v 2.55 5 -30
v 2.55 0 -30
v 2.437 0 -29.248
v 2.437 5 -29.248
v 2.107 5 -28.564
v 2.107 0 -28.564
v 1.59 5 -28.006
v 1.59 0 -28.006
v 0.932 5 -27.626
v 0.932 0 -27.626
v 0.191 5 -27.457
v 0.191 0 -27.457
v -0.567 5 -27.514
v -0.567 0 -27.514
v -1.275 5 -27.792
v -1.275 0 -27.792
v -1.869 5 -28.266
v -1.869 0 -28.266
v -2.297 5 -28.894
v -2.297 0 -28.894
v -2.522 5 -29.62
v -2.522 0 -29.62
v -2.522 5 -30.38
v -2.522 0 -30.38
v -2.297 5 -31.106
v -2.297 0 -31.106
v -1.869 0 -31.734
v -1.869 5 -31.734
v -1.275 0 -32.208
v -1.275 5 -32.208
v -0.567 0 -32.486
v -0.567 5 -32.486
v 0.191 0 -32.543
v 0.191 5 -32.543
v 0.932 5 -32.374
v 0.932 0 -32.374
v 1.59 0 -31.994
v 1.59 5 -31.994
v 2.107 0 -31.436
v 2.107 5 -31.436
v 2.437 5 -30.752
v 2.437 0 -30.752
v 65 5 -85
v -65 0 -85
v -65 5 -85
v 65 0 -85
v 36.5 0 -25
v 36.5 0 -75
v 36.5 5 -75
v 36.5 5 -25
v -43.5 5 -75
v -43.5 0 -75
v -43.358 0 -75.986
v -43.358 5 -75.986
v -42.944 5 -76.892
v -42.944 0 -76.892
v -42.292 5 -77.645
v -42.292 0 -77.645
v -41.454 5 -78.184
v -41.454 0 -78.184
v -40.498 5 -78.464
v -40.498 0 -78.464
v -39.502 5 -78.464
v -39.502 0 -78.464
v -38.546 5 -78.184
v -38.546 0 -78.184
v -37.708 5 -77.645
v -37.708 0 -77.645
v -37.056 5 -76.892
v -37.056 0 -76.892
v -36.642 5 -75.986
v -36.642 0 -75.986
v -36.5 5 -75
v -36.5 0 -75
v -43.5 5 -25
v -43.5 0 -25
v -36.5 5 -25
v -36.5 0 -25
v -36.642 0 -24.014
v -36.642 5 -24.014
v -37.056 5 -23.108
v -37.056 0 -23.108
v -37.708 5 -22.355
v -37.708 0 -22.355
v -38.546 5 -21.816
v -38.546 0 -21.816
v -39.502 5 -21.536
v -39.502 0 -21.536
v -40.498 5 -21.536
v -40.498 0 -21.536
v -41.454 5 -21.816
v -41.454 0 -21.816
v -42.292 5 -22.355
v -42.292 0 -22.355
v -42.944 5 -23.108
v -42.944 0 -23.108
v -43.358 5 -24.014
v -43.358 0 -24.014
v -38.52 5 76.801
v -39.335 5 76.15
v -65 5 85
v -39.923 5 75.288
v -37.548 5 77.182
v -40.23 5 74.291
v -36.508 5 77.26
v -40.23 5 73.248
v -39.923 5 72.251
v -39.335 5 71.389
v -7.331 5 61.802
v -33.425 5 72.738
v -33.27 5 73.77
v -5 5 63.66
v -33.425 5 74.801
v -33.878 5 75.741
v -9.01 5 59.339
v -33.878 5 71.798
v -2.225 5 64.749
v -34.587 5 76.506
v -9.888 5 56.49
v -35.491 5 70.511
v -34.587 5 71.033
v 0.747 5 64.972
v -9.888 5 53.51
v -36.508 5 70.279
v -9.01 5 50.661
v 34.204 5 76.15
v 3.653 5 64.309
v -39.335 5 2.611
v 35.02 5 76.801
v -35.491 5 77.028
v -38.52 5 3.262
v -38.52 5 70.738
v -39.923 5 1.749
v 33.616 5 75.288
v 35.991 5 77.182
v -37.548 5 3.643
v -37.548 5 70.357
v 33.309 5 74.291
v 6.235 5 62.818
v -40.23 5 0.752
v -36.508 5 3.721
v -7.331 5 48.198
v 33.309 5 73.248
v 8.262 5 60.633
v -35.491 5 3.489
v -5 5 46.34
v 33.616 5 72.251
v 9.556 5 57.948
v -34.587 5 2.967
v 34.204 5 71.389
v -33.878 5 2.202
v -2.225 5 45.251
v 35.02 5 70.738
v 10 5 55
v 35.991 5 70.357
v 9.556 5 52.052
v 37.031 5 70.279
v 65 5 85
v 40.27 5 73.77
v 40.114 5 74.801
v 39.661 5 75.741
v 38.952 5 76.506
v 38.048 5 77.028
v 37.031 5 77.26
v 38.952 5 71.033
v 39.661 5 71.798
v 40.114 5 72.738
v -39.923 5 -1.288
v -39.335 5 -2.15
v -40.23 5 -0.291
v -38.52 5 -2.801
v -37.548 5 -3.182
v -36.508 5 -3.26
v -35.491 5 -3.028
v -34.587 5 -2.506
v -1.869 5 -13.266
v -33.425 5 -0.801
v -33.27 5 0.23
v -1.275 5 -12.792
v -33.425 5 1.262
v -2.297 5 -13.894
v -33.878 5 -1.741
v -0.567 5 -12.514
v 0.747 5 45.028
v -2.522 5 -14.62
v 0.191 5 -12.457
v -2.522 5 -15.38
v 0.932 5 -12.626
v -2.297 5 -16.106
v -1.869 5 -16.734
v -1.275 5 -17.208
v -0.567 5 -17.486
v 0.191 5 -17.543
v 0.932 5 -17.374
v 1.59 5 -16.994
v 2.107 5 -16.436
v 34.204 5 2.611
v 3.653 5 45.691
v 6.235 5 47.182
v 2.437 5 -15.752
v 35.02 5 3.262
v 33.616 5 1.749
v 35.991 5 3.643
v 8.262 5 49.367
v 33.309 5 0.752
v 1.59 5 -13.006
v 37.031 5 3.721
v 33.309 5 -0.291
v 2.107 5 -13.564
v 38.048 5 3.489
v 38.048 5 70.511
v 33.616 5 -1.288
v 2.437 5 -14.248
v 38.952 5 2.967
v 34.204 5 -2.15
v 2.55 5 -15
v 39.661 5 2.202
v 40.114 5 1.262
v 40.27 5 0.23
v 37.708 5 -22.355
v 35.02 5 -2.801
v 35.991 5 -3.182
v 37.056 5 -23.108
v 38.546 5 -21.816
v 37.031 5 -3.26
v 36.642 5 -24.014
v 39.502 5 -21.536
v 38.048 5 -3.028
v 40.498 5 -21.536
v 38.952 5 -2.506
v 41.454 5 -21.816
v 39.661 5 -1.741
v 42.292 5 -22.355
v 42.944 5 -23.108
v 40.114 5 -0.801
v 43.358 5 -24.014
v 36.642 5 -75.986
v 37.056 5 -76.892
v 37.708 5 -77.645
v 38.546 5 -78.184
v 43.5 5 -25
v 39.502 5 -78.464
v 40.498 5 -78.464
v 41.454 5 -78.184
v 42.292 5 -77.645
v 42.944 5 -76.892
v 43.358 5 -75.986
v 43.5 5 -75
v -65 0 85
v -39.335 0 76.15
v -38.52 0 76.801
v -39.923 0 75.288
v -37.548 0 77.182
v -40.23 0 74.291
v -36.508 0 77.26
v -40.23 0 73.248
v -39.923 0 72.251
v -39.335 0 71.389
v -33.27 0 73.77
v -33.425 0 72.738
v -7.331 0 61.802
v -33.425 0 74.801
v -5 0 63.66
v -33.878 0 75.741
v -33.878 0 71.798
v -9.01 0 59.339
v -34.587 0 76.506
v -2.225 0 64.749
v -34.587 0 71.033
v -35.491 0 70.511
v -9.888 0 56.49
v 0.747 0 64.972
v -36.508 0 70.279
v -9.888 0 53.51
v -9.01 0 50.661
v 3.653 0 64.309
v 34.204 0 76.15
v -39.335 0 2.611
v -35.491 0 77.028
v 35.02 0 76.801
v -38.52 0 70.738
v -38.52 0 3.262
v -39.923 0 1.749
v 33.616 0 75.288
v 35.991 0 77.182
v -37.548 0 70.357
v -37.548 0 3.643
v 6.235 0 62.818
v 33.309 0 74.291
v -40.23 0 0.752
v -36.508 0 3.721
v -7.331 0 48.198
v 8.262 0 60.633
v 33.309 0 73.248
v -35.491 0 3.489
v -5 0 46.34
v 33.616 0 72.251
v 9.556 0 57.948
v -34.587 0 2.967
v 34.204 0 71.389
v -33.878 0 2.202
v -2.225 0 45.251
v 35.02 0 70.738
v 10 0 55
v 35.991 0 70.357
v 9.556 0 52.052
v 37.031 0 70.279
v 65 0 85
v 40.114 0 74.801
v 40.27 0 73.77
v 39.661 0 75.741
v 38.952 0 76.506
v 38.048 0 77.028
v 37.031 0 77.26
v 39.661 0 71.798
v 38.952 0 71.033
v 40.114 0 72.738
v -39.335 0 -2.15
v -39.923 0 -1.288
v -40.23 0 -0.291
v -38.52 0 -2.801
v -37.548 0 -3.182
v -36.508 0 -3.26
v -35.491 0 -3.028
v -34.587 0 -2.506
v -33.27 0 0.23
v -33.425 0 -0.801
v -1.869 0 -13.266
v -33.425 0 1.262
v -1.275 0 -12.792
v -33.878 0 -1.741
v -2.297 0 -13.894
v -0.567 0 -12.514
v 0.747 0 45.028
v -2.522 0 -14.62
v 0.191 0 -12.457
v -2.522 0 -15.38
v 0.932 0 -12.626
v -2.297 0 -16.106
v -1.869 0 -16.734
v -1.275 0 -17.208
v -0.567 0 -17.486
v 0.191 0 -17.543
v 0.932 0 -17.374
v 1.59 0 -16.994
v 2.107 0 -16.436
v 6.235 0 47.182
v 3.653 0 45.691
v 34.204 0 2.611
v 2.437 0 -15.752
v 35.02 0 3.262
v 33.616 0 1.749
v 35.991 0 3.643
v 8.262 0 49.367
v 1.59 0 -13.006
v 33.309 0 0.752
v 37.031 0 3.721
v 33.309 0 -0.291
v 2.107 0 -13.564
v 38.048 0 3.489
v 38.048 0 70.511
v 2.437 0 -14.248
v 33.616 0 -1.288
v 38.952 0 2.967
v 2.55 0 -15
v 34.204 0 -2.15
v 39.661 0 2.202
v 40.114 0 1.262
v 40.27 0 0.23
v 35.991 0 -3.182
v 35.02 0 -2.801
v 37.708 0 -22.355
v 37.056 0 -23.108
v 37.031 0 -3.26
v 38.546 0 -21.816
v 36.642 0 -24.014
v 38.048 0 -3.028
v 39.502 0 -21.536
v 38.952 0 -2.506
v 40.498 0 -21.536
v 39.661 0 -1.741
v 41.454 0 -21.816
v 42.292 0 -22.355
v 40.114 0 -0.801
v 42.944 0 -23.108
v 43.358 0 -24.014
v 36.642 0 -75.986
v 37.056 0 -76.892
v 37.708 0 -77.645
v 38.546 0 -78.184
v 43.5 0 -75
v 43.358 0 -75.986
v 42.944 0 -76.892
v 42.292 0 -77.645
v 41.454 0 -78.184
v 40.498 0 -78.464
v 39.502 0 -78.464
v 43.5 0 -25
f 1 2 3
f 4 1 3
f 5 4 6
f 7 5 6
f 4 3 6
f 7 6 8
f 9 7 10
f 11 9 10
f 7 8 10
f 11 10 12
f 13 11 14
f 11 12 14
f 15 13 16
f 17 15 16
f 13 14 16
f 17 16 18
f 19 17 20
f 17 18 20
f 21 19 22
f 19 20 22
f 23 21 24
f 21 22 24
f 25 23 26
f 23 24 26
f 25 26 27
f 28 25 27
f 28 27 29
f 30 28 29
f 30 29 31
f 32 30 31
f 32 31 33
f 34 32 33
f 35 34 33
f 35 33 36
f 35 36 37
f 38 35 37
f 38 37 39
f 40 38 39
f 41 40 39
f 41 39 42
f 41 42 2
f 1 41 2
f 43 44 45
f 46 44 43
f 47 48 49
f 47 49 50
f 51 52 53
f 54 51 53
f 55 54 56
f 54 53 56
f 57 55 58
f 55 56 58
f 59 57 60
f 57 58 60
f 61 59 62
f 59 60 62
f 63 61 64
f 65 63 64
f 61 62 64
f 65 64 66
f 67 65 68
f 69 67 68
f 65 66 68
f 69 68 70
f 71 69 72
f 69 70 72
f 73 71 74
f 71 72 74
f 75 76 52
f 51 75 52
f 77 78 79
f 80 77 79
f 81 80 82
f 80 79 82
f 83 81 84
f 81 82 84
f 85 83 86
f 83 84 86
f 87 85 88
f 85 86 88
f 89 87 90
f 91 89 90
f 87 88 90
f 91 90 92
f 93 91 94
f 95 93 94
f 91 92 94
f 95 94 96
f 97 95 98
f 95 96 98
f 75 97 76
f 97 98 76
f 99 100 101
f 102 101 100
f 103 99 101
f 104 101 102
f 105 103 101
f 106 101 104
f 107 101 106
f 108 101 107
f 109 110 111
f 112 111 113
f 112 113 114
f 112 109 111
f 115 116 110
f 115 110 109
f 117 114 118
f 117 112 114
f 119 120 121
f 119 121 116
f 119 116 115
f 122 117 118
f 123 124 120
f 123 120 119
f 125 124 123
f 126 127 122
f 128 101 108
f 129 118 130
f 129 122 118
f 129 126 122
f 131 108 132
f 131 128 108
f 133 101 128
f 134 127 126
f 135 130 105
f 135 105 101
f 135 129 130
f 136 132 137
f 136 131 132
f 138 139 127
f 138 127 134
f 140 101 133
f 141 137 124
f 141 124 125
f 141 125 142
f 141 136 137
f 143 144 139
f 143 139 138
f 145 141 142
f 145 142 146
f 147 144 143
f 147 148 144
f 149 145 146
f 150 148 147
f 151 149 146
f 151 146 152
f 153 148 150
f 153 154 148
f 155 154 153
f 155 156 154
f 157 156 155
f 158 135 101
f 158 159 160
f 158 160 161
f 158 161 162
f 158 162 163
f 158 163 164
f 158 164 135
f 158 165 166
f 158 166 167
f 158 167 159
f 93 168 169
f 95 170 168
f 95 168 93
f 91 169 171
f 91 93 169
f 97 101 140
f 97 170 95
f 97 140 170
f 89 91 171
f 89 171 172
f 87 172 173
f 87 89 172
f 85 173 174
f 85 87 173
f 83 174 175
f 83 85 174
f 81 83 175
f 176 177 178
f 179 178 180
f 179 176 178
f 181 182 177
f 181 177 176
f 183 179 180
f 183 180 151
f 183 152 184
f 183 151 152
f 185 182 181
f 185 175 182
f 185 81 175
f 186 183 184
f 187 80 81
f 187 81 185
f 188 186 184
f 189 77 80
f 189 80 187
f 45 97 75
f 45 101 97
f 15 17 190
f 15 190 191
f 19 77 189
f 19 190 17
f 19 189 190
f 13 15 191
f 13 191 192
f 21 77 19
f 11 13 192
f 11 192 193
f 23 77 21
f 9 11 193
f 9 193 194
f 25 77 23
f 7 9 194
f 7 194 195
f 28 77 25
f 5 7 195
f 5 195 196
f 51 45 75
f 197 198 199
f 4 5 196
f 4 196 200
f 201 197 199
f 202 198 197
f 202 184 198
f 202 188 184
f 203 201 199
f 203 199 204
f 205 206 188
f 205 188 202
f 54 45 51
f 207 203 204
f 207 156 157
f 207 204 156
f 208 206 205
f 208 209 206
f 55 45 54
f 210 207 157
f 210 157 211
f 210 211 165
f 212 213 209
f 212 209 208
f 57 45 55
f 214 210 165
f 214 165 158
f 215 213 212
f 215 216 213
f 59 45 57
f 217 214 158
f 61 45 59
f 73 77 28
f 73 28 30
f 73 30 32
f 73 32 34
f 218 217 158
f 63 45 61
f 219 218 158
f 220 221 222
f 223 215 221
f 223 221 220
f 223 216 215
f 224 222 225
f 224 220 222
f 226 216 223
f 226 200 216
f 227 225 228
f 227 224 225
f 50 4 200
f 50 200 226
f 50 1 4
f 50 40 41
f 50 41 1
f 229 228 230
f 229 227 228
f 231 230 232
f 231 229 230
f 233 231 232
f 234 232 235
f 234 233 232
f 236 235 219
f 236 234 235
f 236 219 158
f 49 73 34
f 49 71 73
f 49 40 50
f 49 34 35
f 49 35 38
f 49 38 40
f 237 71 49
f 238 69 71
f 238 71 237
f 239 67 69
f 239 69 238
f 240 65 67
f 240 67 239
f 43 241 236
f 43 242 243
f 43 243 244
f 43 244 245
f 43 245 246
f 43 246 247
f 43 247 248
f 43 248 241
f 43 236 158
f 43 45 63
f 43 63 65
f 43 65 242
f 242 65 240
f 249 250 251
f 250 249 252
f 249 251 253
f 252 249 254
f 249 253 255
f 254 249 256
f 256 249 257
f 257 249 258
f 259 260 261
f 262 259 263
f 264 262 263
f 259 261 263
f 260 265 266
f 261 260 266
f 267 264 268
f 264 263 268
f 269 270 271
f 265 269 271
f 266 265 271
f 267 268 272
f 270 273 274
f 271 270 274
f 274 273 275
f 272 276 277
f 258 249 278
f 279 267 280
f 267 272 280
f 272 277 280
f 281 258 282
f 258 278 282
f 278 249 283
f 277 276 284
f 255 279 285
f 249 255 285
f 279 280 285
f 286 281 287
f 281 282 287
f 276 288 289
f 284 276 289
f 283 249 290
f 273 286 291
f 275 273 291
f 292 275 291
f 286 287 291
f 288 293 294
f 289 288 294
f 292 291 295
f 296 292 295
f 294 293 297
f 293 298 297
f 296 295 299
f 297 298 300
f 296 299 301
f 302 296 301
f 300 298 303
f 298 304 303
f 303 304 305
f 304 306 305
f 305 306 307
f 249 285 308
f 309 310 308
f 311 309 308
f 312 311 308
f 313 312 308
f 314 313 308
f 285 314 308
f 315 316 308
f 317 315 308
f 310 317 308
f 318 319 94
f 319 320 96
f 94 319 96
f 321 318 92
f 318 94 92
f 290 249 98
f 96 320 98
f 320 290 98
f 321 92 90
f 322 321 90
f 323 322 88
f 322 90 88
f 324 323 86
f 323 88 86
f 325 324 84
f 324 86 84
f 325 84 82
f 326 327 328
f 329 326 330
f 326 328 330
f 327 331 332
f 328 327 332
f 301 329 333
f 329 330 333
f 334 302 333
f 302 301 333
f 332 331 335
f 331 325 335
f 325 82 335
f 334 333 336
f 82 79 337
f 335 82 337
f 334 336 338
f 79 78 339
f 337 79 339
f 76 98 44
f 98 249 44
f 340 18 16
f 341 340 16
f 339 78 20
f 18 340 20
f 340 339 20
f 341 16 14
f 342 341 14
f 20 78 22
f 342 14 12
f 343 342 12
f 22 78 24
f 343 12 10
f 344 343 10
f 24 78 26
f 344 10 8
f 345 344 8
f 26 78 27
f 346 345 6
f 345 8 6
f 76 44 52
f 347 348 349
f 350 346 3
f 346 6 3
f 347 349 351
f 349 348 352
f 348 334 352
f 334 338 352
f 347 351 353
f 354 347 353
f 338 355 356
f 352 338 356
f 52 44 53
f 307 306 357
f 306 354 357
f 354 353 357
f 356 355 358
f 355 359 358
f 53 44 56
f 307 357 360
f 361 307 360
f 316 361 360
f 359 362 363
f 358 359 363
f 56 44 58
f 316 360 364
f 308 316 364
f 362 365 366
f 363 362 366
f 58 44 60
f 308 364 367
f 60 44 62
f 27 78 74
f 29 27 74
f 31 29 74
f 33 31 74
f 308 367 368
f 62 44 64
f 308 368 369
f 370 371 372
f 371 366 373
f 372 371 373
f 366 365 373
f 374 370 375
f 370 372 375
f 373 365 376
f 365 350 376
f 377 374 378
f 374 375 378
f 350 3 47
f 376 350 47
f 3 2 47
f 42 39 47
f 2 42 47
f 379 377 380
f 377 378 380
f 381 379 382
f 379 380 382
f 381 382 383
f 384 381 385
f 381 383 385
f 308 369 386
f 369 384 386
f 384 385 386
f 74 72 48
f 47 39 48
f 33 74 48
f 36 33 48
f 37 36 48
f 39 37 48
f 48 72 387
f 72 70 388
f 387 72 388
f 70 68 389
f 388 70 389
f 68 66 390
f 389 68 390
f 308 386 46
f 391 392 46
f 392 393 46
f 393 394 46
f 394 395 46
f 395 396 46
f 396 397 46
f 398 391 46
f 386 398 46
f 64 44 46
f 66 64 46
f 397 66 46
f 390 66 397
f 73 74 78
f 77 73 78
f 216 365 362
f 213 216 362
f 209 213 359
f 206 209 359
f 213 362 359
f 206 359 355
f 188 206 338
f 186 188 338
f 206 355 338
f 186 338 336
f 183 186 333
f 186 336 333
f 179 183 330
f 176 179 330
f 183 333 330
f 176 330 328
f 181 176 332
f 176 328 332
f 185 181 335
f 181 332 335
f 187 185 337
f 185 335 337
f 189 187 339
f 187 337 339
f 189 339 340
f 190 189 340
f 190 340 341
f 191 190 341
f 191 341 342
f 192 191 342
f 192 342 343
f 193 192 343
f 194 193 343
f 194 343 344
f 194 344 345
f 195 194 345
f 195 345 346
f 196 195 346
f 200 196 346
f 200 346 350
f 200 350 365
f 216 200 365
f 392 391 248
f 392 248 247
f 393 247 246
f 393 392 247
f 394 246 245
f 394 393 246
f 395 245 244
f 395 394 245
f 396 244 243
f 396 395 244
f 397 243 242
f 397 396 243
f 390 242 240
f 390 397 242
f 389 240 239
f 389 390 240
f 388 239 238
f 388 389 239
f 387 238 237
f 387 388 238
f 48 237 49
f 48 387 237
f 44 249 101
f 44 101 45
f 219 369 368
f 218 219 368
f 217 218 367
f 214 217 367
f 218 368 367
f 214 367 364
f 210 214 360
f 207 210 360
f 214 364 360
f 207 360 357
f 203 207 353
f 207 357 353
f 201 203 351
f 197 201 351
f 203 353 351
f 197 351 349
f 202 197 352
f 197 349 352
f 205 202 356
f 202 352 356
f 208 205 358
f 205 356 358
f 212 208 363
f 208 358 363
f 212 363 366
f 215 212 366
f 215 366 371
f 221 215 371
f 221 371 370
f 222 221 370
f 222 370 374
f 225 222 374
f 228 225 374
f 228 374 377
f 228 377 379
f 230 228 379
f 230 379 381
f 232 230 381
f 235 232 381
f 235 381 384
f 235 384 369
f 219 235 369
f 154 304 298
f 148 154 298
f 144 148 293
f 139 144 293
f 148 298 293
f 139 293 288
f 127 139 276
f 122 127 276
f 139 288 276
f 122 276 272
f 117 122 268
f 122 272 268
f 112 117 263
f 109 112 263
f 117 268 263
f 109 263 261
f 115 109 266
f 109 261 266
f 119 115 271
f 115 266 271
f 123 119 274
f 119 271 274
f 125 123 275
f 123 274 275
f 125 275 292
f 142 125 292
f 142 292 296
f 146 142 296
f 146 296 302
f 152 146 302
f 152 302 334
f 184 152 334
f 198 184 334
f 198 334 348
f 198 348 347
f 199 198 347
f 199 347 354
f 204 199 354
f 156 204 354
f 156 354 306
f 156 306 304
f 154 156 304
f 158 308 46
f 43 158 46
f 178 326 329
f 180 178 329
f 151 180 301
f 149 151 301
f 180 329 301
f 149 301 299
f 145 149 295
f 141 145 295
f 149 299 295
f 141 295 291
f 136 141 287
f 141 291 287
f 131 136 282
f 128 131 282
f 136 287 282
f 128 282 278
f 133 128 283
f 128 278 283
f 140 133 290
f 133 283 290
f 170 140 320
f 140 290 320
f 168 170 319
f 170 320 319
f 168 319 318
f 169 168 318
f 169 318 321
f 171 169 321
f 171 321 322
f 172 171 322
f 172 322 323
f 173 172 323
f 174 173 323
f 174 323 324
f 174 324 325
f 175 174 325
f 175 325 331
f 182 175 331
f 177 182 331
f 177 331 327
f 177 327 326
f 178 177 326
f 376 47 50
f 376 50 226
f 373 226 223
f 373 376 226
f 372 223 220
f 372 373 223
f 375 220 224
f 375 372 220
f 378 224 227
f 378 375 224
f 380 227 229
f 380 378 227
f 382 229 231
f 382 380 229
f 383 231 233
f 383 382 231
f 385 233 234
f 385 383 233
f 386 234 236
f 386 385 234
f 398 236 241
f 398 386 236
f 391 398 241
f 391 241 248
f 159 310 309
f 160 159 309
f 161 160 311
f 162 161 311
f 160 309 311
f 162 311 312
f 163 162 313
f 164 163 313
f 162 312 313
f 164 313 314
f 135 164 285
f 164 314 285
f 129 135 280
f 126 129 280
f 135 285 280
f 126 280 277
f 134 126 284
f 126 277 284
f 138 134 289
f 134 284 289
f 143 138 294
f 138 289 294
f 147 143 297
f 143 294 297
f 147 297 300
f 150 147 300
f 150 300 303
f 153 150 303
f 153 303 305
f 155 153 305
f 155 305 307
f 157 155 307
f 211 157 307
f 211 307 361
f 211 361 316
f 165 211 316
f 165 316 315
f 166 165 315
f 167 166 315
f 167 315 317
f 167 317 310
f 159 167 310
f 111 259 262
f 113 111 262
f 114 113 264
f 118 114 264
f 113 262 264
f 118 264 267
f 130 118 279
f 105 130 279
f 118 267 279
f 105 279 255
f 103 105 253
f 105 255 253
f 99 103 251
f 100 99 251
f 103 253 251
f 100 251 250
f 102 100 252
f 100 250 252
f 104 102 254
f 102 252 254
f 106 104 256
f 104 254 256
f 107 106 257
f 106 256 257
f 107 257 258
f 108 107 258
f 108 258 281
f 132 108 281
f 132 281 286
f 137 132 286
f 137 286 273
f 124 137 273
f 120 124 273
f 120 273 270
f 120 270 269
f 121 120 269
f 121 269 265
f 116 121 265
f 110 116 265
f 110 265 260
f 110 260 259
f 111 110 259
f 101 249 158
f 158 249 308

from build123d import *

# Parameters (mm, degrees)
SKETCH_3_W          = 130
SKETCH_3_H          = 170
EXTRUDE_1_DEPTH     = 5
SKETCH_4_R          = 10
CUT_EXTRUDE_1_DEPTH = 10
SKETCH_5_R          = 3.5
SKETCH_5_R_2        = 2.55
CUT_EXTRUDE_2_DEPTH = 10


with BuildPart() as part:
    # 草图3 → 凸台-拉伸1 (new body)
    with BuildSketch(Plane(origin=(0, 0, 0), x_dir=(1, 0, 0), z_dir=(0, 1, 0))):
        Rectangle(SKETCH_3_W, SKETCH_3_H)
    extrude(amount=EXTRUDE_1_DEPTH)

    # 草图4 → 切除-拉伸1 (cut)
    with BuildSketch(Plane.XZ):
        with Locations((0, 55)):
            Circle(SKETCH_4_R)
    extrude(amount=-CUT_EXTRUDE_1_DEPTH, mode=Mode.SUBTRACT)

    # 草图5 → 切除-拉伸2 (cut)
    with BuildSketch(Plane.XZ):
        with Locations((36.769552622, 0.230447378)):
            Circle(SKETCH_5_R)
        with Locations((-36.769552622, 0.230447378)):
            Circle(SKETCH_5_R)
        with Locations((-36.769552622, 73.769552622)):
            Circle(SKETCH_5_R)
        with Locations((36.769552622, 73.769552622)):
            Circle(SKETCH_5_R)
        with Locations((0, -30)):
            Circle(SKETCH_5_R_2)
        with Locations((0, -15)):
            Circle(SKETCH_5_R_2)
        with BuildLine():
            Line((36.5, -75), (36.5, -25))
            ThreePointArc((36.5, -25), (40, -21.5), (43.5, -25))
            Line((43.5, -25), (43.5, -75))
            ThreePointArc((43.5, -75), (40, -78.5), (36.5, -75))
        make_face()
        with BuildLine():
            Line((-36.5, -75), (-36.5, -25))
            ThreePointArc((-36.5, -25), (-40, -21.5), (-43.5, -25))
            Line((-43.5, -25), (-43.5, -75))
            ThreePointArc((-43.5, -75), (-40, -78.5), (-36.5, -75))
        make_face()
    extrude(amount=-CUT_EXTRUDE_2_DEPTH, mode=Mode.SUBTRACT)


solid = part.part
